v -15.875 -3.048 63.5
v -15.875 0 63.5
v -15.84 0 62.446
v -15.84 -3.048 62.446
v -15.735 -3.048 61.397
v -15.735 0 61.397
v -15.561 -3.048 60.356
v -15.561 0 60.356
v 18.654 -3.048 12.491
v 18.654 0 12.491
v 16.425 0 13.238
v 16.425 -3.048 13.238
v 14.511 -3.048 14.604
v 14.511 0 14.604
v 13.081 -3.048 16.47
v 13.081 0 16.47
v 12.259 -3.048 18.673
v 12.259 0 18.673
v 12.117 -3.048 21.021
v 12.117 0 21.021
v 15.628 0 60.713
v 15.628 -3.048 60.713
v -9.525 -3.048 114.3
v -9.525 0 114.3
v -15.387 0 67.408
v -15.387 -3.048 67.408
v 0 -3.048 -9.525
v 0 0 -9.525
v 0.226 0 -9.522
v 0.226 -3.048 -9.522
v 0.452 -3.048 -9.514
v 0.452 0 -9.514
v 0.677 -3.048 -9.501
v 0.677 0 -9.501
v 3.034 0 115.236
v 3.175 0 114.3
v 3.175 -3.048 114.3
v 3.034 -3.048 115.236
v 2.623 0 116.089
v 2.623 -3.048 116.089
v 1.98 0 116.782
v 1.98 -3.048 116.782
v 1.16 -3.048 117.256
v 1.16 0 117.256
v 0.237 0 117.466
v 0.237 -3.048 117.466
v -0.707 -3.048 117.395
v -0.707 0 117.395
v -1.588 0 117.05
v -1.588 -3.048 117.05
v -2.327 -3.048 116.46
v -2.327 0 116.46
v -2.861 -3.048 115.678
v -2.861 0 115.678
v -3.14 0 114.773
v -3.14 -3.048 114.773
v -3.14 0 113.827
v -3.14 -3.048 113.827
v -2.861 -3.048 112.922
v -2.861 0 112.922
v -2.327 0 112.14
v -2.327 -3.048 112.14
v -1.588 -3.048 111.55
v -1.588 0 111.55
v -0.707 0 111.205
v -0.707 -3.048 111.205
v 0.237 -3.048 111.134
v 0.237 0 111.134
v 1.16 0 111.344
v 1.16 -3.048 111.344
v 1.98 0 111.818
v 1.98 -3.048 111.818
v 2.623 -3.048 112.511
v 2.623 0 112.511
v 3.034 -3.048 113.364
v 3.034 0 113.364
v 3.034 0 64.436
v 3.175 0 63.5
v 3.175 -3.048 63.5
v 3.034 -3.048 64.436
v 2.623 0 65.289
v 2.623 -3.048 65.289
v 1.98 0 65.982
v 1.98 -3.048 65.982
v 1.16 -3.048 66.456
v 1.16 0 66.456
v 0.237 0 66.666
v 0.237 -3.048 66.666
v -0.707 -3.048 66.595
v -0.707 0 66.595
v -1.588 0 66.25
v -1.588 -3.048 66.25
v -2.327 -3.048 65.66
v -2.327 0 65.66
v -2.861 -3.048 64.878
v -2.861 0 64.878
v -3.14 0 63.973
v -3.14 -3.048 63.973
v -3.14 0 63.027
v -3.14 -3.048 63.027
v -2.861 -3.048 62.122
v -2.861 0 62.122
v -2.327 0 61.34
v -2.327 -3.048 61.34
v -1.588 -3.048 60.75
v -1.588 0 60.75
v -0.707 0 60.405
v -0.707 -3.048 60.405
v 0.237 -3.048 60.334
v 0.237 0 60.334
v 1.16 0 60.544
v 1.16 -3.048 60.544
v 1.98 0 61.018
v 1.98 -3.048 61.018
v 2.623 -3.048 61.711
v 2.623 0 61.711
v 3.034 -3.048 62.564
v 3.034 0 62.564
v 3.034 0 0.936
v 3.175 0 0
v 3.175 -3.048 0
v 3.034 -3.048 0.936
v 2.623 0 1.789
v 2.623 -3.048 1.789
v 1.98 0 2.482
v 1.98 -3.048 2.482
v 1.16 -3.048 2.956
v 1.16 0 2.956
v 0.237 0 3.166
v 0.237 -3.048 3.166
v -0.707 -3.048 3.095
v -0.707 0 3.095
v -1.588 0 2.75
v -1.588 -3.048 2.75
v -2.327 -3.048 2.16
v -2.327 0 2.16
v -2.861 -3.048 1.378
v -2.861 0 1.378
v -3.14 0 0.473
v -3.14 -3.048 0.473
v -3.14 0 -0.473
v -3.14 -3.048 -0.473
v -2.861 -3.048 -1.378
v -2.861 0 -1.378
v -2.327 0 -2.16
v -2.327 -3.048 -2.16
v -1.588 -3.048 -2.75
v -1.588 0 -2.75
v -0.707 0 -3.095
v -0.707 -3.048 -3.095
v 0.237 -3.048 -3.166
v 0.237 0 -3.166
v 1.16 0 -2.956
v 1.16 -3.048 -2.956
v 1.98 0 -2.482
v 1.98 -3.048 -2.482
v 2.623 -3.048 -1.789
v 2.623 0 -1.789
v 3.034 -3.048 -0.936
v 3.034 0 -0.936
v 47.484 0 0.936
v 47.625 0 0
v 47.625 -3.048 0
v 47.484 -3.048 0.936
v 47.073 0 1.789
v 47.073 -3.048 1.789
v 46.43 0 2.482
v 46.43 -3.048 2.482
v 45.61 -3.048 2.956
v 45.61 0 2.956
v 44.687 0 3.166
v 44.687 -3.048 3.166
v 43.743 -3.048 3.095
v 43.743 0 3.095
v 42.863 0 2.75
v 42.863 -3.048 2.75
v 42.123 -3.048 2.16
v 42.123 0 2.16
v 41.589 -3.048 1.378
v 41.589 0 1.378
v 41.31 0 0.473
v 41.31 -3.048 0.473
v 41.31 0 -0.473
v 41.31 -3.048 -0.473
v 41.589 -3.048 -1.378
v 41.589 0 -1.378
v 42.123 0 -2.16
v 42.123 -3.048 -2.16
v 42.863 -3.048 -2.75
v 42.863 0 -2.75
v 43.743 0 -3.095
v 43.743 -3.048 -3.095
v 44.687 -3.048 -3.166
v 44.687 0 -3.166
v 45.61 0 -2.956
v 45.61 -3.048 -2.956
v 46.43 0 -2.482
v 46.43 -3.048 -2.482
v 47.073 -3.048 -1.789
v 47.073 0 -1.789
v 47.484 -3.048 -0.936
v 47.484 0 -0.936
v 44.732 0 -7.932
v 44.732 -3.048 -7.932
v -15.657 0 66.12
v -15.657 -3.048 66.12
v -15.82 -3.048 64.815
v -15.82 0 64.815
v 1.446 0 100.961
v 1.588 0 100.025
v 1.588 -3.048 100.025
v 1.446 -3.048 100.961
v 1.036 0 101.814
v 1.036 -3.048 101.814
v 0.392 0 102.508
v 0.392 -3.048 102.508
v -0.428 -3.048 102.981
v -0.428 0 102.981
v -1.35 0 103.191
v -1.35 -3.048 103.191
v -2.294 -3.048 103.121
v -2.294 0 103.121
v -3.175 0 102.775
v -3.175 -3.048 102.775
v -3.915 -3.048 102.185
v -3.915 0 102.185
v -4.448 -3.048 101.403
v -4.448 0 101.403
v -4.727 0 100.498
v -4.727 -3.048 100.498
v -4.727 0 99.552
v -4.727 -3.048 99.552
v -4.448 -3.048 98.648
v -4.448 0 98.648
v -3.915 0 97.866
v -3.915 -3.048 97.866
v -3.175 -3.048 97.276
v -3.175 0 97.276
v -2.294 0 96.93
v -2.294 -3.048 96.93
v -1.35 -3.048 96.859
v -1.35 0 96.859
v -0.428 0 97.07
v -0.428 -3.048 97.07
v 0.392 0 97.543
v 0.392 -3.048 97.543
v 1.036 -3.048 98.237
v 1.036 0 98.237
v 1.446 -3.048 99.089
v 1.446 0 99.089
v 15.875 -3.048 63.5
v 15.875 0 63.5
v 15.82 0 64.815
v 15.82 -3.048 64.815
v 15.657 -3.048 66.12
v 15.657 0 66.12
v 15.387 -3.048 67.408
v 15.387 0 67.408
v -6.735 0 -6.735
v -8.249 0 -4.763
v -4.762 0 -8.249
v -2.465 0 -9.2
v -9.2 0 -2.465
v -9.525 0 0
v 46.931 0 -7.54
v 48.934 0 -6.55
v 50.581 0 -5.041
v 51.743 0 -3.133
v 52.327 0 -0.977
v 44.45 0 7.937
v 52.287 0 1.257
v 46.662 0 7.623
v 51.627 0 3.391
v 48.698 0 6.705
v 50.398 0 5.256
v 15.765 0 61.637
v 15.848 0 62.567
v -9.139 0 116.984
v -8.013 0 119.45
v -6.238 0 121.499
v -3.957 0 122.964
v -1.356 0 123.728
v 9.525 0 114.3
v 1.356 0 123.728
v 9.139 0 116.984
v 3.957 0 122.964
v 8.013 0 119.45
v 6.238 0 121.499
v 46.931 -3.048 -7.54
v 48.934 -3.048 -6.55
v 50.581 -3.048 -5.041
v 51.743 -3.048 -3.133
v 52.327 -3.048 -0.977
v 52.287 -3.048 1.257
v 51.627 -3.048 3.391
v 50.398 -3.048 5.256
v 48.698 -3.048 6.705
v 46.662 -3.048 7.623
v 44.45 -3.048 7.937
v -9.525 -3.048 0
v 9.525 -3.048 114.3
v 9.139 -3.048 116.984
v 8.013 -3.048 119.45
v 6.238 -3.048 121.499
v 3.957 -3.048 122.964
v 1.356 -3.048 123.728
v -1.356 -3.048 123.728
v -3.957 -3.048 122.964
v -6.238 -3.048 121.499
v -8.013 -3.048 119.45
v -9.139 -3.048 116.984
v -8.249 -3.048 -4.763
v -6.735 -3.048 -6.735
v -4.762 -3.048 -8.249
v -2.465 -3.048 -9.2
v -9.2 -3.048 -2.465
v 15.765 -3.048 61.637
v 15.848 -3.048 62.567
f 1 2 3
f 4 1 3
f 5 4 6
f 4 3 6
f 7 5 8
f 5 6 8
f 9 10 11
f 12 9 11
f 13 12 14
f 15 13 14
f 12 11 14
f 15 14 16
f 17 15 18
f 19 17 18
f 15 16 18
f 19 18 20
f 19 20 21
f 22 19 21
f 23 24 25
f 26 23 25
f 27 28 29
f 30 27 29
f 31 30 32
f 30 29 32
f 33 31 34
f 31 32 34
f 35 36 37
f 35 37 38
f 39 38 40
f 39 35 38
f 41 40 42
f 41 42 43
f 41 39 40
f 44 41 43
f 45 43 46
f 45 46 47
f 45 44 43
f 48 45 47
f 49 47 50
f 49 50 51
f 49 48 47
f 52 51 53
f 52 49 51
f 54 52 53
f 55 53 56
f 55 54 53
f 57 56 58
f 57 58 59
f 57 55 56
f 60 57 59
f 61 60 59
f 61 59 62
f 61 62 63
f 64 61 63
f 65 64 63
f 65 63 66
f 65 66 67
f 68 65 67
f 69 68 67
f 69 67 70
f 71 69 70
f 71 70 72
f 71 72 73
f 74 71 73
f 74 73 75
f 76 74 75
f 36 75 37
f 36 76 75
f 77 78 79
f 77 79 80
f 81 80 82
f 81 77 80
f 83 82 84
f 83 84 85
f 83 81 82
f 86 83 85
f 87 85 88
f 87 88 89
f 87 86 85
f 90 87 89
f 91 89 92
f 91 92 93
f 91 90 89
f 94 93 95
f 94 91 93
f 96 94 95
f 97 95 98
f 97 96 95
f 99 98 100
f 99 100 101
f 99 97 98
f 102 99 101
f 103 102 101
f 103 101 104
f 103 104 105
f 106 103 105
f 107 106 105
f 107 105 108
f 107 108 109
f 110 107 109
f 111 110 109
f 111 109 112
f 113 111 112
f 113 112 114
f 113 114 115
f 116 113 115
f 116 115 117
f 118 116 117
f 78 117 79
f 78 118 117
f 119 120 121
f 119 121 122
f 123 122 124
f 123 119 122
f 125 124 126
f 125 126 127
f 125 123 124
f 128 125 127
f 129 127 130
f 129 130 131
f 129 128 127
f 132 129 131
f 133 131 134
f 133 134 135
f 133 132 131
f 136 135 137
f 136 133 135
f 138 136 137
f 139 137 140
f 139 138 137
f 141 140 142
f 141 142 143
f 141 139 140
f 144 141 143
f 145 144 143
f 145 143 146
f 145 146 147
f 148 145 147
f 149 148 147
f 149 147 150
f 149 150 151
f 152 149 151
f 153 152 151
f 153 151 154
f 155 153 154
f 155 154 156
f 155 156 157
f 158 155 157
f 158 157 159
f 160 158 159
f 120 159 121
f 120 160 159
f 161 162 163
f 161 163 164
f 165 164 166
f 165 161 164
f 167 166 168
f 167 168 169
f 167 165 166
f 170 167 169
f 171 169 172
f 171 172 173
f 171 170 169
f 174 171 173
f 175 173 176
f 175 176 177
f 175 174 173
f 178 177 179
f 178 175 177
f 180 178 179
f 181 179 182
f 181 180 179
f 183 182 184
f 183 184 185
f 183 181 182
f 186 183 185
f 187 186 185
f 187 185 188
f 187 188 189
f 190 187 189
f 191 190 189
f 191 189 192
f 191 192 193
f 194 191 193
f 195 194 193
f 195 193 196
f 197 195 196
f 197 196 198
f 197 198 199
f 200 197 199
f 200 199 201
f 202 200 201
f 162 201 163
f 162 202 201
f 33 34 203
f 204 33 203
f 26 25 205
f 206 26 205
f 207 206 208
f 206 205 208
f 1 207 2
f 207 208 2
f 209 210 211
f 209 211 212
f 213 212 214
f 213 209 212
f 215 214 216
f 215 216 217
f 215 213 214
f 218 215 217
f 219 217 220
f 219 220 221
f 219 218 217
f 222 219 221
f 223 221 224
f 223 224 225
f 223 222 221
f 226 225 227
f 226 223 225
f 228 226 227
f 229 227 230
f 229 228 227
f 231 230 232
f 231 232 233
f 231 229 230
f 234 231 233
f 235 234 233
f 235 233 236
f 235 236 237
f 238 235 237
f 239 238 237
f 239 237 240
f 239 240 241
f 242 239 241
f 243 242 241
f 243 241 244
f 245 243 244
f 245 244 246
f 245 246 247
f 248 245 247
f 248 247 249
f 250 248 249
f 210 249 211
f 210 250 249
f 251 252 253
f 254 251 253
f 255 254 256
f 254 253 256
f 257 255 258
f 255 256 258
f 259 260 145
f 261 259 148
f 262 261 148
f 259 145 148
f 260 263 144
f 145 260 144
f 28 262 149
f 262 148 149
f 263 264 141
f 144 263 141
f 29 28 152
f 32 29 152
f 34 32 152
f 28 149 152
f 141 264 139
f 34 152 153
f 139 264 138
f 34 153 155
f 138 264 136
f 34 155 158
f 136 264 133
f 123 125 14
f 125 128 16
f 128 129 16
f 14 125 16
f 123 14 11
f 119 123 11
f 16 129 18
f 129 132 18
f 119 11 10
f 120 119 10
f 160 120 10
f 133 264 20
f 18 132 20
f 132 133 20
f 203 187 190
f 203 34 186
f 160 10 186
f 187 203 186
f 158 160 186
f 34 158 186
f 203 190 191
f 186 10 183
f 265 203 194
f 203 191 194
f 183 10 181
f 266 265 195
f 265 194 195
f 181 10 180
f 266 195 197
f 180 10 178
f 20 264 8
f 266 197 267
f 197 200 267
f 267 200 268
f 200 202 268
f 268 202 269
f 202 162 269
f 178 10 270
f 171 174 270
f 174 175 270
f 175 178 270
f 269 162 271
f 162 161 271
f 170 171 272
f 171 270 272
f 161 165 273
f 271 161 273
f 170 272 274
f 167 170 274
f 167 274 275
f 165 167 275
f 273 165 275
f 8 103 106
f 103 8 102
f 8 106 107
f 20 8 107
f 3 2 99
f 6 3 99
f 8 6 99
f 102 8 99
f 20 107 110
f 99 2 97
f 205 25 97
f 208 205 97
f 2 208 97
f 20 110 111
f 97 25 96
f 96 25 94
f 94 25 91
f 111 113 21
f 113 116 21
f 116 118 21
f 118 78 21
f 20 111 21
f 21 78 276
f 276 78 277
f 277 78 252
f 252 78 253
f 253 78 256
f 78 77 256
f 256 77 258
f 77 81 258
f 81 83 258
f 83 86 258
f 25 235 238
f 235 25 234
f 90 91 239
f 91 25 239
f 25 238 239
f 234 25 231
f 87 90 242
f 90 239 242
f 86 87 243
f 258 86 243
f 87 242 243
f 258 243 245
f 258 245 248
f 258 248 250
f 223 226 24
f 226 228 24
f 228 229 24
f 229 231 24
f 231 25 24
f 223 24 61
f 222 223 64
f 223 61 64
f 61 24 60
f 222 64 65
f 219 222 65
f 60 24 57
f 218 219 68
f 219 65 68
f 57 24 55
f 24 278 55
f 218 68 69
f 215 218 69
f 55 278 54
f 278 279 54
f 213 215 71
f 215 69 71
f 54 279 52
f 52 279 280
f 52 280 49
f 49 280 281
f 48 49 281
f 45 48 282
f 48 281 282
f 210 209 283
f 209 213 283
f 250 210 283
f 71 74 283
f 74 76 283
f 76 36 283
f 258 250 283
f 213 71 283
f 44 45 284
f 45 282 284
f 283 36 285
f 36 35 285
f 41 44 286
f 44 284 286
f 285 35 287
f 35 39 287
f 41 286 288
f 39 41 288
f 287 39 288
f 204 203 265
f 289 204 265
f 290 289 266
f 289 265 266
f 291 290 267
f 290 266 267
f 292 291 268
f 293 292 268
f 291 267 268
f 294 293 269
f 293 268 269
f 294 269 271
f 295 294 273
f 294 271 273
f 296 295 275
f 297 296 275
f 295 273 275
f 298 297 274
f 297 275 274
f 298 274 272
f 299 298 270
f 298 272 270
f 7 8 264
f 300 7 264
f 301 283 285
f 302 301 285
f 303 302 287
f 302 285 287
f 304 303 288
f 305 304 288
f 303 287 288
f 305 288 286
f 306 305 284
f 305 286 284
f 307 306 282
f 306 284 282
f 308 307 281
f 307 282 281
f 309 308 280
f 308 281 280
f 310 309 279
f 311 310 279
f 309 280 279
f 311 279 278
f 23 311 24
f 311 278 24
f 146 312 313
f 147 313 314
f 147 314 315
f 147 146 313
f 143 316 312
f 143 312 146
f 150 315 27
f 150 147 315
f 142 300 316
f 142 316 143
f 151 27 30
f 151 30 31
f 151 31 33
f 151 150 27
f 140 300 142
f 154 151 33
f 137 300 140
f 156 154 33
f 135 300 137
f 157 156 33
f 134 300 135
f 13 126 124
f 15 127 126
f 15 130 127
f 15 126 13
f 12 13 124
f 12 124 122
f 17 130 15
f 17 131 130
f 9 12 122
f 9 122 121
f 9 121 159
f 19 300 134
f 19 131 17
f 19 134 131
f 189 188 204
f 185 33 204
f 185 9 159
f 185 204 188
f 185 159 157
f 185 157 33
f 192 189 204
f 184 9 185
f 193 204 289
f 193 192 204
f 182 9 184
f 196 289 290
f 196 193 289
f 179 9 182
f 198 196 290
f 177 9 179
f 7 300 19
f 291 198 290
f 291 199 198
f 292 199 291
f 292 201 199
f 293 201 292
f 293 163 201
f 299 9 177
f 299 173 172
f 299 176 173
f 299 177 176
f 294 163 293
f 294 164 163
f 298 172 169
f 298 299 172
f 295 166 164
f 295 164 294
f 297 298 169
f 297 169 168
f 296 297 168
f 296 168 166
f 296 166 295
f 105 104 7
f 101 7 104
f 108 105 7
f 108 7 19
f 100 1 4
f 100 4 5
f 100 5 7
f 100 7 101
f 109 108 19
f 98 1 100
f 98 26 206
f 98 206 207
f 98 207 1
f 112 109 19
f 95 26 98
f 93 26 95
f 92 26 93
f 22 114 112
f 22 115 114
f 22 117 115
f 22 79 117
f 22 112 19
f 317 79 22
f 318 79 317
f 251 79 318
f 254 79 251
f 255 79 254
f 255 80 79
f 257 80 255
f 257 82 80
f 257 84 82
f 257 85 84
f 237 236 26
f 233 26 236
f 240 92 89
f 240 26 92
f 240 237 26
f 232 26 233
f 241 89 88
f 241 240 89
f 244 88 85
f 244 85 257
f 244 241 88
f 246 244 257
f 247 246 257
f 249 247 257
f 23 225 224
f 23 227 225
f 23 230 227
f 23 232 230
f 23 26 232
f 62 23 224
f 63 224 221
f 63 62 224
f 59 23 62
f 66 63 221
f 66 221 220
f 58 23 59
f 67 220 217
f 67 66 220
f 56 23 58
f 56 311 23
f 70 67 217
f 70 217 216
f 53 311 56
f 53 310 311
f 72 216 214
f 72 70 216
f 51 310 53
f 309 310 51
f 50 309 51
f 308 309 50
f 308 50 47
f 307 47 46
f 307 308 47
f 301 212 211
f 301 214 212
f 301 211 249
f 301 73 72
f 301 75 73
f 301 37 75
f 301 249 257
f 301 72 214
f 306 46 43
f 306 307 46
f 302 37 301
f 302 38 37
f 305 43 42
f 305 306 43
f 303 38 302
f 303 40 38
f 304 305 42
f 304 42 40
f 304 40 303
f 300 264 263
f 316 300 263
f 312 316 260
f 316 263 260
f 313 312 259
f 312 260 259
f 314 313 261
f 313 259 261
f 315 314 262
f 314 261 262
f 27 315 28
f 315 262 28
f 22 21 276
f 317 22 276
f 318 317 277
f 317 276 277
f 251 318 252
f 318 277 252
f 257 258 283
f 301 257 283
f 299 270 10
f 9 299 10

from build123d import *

# Parameters (mm, degrees)
F0_R     = 3.175
F1_DEPTH = 3.048


with BuildPart() as f1:
    # F0 (on Front) → F1 (new body)
    with BuildSketch(Plane.XZ):
        with BuildLine():
            ThreePointArc((0.6773435479, -9.500885786), (6.9705567315, -6.4912990883), (9.525, 0))
            ThreePointArc((9.525, 0), (0, 9.525), (-9.525, 0))
            ThreePointArc((-9.525, 0), (-6.7351920908, -6.7351920908), (0, -9.525))
            Line((0, -9.525), (0.6773435479, -9.500885786))
        make_face()
        Circle(F0_R, mode=Mode.SUBTRACT)
        with BuildLine():
            ThreePointArc((-9.525, 0), (0, 9.525), (9.525, 0))
            ThreePointArc((9.525, 0), (6.9705567315, -6.4912990883), (0.6773435479, -9.500885786))
            Line((0.6773435479, -9.500885786), (44.7324052746, -7.9324746146))
            ThreePointArc((44.7324052746, -7.9324746146), (36.5137564458, -0.1412249921), (44.45, 7.9375))
            Line((44.45, 7.9375), (18.6544621675, 12.4908351229))
            ThreePointArc((18.6544621675, 12.4908351229), (13.7263384996, 15.4838524031), (12.1171642333, 21.020558419))
            Line((12.1171642333, 21.020558419), (15.6284662769, 60.7131259747))
            ThreePointArc((15.6284662769, 60.7131259747), (0.1815405689, 47.626038049), (-15.5606435644, 60.3564356436))
            Line((-15.5606435644, 60.3564356436), (-9.525, 0))
        make_face()
        with BuildLine():
            ThreePointArc((0, -9.525), (0.3388863295, -9.5189695375), (0.6773435479, -9.500885786))
            Line((0.6773435479, -9.500885786), (0, -9.525))
        make_face()
        with BuildLine():
            Line((-15.875, 63.5), (-15.5606435644, 60.3564356436))
            ThreePointArc((-15.5606435644, 60.3564356436), (0.1815405689, 47.626038049), (15.6284662769, 60.7131259747))
            Line((15.6284662769, 60.7131259747), (15.875, 63.5))
            Line((15.875, 63.5), (15.3865384615, 67.4076923077))
            ThreePointArc((15.3865384615, 67.4076923077), (0, 79.375), (-15.3865384615, 67.4076923077))
            Line((-15.3865384615, 67.4076923077), (-15.875, 63.5))
        make_face()
        with Locations((0, 63.5)):
            Circle(F0_R, mode=Mode.SUBTRACT)
        with BuildLine():
            ThreePointArc((-15.875, 63.5), (-15.7962153946, 61.9203784605), (-15.5606435644, 60.3564356436))
            Line((-15.5606435644, 60.3564356436), (-15.875, 63.5))
        make_face()
        with BuildLine():
            ThreePointArc((44.45, 7.9375), (36.5137564458, -0.1412249921), (44.7324052746, -7.9324746146))
            ThreePointArc((44.7324052746, -7.9324746146), (50.1616327839, -5.5119104847), (52.3875, 0))
            ThreePointArc((52.3875, 0), (50.0626600757, 5.6126600757), (44.45, 7.9375))
        make_face()
        with Locations((44.45, 0)):
            Circle(F0_R, mode=Mode.SUBTRACT)
        with BuildLine():
            ThreePointArc((-15.3865384615, 67.4076923077), (-15.7524112928, 65.4690514116), (-15.875, 63.5))
            Line((-15.875, 63.5), (-15.3865384615, 67.4076923077))
        make_face()
        with BuildLine():
            Line((15.875, 63.5), (15.6284662769, 60.7131259747))
            ThreePointArc((15.6284662769, 60.7131259747), (15.813246459, 62.1011213679), (15.875, 63.5))
        make_face()
        with BuildLine():
            Line((-9.525, 114.3), (-15.3865384615, 67.4076923077))
            ThreePointArc((-15.3865384615, 67.4076923077), (0, 79.375), (15.3865384615, 67.4076923077))
            Line((15.3865384615, 67.4076923077), (9.525, 114.3))
            ThreePointArc((9.525, 114.3), (0, 104.775), (-9.525, 114.3))
        make_face()
        with Locations((-1.5875, 100.0252)):
            Circle(F0_R, mode=Mode.SUBTRACT)
        with BuildLine():
            Line((15.3865384615, 67.4076923077), (15.875, 63.5))
            ThreePointArc((15.875, 63.5), (15.7524112928, 65.4690514116), (15.3865384615, 67.4076923077))
        make_face()
        with BuildLine():
            ThreePointArc((9.525, 114.3), (0, 123.825), (-9.525, 114.3))
            ThreePointArc((-9.525, 114.3), (0, 104.775), (9.525, 114.3))
        make_face()
        with Locations((0, 114.3)):
            Circle(F0_R, mode=Mode.SUBTRACT)
    extrude(amount=F1_DEPTH)


solid = f1.part
